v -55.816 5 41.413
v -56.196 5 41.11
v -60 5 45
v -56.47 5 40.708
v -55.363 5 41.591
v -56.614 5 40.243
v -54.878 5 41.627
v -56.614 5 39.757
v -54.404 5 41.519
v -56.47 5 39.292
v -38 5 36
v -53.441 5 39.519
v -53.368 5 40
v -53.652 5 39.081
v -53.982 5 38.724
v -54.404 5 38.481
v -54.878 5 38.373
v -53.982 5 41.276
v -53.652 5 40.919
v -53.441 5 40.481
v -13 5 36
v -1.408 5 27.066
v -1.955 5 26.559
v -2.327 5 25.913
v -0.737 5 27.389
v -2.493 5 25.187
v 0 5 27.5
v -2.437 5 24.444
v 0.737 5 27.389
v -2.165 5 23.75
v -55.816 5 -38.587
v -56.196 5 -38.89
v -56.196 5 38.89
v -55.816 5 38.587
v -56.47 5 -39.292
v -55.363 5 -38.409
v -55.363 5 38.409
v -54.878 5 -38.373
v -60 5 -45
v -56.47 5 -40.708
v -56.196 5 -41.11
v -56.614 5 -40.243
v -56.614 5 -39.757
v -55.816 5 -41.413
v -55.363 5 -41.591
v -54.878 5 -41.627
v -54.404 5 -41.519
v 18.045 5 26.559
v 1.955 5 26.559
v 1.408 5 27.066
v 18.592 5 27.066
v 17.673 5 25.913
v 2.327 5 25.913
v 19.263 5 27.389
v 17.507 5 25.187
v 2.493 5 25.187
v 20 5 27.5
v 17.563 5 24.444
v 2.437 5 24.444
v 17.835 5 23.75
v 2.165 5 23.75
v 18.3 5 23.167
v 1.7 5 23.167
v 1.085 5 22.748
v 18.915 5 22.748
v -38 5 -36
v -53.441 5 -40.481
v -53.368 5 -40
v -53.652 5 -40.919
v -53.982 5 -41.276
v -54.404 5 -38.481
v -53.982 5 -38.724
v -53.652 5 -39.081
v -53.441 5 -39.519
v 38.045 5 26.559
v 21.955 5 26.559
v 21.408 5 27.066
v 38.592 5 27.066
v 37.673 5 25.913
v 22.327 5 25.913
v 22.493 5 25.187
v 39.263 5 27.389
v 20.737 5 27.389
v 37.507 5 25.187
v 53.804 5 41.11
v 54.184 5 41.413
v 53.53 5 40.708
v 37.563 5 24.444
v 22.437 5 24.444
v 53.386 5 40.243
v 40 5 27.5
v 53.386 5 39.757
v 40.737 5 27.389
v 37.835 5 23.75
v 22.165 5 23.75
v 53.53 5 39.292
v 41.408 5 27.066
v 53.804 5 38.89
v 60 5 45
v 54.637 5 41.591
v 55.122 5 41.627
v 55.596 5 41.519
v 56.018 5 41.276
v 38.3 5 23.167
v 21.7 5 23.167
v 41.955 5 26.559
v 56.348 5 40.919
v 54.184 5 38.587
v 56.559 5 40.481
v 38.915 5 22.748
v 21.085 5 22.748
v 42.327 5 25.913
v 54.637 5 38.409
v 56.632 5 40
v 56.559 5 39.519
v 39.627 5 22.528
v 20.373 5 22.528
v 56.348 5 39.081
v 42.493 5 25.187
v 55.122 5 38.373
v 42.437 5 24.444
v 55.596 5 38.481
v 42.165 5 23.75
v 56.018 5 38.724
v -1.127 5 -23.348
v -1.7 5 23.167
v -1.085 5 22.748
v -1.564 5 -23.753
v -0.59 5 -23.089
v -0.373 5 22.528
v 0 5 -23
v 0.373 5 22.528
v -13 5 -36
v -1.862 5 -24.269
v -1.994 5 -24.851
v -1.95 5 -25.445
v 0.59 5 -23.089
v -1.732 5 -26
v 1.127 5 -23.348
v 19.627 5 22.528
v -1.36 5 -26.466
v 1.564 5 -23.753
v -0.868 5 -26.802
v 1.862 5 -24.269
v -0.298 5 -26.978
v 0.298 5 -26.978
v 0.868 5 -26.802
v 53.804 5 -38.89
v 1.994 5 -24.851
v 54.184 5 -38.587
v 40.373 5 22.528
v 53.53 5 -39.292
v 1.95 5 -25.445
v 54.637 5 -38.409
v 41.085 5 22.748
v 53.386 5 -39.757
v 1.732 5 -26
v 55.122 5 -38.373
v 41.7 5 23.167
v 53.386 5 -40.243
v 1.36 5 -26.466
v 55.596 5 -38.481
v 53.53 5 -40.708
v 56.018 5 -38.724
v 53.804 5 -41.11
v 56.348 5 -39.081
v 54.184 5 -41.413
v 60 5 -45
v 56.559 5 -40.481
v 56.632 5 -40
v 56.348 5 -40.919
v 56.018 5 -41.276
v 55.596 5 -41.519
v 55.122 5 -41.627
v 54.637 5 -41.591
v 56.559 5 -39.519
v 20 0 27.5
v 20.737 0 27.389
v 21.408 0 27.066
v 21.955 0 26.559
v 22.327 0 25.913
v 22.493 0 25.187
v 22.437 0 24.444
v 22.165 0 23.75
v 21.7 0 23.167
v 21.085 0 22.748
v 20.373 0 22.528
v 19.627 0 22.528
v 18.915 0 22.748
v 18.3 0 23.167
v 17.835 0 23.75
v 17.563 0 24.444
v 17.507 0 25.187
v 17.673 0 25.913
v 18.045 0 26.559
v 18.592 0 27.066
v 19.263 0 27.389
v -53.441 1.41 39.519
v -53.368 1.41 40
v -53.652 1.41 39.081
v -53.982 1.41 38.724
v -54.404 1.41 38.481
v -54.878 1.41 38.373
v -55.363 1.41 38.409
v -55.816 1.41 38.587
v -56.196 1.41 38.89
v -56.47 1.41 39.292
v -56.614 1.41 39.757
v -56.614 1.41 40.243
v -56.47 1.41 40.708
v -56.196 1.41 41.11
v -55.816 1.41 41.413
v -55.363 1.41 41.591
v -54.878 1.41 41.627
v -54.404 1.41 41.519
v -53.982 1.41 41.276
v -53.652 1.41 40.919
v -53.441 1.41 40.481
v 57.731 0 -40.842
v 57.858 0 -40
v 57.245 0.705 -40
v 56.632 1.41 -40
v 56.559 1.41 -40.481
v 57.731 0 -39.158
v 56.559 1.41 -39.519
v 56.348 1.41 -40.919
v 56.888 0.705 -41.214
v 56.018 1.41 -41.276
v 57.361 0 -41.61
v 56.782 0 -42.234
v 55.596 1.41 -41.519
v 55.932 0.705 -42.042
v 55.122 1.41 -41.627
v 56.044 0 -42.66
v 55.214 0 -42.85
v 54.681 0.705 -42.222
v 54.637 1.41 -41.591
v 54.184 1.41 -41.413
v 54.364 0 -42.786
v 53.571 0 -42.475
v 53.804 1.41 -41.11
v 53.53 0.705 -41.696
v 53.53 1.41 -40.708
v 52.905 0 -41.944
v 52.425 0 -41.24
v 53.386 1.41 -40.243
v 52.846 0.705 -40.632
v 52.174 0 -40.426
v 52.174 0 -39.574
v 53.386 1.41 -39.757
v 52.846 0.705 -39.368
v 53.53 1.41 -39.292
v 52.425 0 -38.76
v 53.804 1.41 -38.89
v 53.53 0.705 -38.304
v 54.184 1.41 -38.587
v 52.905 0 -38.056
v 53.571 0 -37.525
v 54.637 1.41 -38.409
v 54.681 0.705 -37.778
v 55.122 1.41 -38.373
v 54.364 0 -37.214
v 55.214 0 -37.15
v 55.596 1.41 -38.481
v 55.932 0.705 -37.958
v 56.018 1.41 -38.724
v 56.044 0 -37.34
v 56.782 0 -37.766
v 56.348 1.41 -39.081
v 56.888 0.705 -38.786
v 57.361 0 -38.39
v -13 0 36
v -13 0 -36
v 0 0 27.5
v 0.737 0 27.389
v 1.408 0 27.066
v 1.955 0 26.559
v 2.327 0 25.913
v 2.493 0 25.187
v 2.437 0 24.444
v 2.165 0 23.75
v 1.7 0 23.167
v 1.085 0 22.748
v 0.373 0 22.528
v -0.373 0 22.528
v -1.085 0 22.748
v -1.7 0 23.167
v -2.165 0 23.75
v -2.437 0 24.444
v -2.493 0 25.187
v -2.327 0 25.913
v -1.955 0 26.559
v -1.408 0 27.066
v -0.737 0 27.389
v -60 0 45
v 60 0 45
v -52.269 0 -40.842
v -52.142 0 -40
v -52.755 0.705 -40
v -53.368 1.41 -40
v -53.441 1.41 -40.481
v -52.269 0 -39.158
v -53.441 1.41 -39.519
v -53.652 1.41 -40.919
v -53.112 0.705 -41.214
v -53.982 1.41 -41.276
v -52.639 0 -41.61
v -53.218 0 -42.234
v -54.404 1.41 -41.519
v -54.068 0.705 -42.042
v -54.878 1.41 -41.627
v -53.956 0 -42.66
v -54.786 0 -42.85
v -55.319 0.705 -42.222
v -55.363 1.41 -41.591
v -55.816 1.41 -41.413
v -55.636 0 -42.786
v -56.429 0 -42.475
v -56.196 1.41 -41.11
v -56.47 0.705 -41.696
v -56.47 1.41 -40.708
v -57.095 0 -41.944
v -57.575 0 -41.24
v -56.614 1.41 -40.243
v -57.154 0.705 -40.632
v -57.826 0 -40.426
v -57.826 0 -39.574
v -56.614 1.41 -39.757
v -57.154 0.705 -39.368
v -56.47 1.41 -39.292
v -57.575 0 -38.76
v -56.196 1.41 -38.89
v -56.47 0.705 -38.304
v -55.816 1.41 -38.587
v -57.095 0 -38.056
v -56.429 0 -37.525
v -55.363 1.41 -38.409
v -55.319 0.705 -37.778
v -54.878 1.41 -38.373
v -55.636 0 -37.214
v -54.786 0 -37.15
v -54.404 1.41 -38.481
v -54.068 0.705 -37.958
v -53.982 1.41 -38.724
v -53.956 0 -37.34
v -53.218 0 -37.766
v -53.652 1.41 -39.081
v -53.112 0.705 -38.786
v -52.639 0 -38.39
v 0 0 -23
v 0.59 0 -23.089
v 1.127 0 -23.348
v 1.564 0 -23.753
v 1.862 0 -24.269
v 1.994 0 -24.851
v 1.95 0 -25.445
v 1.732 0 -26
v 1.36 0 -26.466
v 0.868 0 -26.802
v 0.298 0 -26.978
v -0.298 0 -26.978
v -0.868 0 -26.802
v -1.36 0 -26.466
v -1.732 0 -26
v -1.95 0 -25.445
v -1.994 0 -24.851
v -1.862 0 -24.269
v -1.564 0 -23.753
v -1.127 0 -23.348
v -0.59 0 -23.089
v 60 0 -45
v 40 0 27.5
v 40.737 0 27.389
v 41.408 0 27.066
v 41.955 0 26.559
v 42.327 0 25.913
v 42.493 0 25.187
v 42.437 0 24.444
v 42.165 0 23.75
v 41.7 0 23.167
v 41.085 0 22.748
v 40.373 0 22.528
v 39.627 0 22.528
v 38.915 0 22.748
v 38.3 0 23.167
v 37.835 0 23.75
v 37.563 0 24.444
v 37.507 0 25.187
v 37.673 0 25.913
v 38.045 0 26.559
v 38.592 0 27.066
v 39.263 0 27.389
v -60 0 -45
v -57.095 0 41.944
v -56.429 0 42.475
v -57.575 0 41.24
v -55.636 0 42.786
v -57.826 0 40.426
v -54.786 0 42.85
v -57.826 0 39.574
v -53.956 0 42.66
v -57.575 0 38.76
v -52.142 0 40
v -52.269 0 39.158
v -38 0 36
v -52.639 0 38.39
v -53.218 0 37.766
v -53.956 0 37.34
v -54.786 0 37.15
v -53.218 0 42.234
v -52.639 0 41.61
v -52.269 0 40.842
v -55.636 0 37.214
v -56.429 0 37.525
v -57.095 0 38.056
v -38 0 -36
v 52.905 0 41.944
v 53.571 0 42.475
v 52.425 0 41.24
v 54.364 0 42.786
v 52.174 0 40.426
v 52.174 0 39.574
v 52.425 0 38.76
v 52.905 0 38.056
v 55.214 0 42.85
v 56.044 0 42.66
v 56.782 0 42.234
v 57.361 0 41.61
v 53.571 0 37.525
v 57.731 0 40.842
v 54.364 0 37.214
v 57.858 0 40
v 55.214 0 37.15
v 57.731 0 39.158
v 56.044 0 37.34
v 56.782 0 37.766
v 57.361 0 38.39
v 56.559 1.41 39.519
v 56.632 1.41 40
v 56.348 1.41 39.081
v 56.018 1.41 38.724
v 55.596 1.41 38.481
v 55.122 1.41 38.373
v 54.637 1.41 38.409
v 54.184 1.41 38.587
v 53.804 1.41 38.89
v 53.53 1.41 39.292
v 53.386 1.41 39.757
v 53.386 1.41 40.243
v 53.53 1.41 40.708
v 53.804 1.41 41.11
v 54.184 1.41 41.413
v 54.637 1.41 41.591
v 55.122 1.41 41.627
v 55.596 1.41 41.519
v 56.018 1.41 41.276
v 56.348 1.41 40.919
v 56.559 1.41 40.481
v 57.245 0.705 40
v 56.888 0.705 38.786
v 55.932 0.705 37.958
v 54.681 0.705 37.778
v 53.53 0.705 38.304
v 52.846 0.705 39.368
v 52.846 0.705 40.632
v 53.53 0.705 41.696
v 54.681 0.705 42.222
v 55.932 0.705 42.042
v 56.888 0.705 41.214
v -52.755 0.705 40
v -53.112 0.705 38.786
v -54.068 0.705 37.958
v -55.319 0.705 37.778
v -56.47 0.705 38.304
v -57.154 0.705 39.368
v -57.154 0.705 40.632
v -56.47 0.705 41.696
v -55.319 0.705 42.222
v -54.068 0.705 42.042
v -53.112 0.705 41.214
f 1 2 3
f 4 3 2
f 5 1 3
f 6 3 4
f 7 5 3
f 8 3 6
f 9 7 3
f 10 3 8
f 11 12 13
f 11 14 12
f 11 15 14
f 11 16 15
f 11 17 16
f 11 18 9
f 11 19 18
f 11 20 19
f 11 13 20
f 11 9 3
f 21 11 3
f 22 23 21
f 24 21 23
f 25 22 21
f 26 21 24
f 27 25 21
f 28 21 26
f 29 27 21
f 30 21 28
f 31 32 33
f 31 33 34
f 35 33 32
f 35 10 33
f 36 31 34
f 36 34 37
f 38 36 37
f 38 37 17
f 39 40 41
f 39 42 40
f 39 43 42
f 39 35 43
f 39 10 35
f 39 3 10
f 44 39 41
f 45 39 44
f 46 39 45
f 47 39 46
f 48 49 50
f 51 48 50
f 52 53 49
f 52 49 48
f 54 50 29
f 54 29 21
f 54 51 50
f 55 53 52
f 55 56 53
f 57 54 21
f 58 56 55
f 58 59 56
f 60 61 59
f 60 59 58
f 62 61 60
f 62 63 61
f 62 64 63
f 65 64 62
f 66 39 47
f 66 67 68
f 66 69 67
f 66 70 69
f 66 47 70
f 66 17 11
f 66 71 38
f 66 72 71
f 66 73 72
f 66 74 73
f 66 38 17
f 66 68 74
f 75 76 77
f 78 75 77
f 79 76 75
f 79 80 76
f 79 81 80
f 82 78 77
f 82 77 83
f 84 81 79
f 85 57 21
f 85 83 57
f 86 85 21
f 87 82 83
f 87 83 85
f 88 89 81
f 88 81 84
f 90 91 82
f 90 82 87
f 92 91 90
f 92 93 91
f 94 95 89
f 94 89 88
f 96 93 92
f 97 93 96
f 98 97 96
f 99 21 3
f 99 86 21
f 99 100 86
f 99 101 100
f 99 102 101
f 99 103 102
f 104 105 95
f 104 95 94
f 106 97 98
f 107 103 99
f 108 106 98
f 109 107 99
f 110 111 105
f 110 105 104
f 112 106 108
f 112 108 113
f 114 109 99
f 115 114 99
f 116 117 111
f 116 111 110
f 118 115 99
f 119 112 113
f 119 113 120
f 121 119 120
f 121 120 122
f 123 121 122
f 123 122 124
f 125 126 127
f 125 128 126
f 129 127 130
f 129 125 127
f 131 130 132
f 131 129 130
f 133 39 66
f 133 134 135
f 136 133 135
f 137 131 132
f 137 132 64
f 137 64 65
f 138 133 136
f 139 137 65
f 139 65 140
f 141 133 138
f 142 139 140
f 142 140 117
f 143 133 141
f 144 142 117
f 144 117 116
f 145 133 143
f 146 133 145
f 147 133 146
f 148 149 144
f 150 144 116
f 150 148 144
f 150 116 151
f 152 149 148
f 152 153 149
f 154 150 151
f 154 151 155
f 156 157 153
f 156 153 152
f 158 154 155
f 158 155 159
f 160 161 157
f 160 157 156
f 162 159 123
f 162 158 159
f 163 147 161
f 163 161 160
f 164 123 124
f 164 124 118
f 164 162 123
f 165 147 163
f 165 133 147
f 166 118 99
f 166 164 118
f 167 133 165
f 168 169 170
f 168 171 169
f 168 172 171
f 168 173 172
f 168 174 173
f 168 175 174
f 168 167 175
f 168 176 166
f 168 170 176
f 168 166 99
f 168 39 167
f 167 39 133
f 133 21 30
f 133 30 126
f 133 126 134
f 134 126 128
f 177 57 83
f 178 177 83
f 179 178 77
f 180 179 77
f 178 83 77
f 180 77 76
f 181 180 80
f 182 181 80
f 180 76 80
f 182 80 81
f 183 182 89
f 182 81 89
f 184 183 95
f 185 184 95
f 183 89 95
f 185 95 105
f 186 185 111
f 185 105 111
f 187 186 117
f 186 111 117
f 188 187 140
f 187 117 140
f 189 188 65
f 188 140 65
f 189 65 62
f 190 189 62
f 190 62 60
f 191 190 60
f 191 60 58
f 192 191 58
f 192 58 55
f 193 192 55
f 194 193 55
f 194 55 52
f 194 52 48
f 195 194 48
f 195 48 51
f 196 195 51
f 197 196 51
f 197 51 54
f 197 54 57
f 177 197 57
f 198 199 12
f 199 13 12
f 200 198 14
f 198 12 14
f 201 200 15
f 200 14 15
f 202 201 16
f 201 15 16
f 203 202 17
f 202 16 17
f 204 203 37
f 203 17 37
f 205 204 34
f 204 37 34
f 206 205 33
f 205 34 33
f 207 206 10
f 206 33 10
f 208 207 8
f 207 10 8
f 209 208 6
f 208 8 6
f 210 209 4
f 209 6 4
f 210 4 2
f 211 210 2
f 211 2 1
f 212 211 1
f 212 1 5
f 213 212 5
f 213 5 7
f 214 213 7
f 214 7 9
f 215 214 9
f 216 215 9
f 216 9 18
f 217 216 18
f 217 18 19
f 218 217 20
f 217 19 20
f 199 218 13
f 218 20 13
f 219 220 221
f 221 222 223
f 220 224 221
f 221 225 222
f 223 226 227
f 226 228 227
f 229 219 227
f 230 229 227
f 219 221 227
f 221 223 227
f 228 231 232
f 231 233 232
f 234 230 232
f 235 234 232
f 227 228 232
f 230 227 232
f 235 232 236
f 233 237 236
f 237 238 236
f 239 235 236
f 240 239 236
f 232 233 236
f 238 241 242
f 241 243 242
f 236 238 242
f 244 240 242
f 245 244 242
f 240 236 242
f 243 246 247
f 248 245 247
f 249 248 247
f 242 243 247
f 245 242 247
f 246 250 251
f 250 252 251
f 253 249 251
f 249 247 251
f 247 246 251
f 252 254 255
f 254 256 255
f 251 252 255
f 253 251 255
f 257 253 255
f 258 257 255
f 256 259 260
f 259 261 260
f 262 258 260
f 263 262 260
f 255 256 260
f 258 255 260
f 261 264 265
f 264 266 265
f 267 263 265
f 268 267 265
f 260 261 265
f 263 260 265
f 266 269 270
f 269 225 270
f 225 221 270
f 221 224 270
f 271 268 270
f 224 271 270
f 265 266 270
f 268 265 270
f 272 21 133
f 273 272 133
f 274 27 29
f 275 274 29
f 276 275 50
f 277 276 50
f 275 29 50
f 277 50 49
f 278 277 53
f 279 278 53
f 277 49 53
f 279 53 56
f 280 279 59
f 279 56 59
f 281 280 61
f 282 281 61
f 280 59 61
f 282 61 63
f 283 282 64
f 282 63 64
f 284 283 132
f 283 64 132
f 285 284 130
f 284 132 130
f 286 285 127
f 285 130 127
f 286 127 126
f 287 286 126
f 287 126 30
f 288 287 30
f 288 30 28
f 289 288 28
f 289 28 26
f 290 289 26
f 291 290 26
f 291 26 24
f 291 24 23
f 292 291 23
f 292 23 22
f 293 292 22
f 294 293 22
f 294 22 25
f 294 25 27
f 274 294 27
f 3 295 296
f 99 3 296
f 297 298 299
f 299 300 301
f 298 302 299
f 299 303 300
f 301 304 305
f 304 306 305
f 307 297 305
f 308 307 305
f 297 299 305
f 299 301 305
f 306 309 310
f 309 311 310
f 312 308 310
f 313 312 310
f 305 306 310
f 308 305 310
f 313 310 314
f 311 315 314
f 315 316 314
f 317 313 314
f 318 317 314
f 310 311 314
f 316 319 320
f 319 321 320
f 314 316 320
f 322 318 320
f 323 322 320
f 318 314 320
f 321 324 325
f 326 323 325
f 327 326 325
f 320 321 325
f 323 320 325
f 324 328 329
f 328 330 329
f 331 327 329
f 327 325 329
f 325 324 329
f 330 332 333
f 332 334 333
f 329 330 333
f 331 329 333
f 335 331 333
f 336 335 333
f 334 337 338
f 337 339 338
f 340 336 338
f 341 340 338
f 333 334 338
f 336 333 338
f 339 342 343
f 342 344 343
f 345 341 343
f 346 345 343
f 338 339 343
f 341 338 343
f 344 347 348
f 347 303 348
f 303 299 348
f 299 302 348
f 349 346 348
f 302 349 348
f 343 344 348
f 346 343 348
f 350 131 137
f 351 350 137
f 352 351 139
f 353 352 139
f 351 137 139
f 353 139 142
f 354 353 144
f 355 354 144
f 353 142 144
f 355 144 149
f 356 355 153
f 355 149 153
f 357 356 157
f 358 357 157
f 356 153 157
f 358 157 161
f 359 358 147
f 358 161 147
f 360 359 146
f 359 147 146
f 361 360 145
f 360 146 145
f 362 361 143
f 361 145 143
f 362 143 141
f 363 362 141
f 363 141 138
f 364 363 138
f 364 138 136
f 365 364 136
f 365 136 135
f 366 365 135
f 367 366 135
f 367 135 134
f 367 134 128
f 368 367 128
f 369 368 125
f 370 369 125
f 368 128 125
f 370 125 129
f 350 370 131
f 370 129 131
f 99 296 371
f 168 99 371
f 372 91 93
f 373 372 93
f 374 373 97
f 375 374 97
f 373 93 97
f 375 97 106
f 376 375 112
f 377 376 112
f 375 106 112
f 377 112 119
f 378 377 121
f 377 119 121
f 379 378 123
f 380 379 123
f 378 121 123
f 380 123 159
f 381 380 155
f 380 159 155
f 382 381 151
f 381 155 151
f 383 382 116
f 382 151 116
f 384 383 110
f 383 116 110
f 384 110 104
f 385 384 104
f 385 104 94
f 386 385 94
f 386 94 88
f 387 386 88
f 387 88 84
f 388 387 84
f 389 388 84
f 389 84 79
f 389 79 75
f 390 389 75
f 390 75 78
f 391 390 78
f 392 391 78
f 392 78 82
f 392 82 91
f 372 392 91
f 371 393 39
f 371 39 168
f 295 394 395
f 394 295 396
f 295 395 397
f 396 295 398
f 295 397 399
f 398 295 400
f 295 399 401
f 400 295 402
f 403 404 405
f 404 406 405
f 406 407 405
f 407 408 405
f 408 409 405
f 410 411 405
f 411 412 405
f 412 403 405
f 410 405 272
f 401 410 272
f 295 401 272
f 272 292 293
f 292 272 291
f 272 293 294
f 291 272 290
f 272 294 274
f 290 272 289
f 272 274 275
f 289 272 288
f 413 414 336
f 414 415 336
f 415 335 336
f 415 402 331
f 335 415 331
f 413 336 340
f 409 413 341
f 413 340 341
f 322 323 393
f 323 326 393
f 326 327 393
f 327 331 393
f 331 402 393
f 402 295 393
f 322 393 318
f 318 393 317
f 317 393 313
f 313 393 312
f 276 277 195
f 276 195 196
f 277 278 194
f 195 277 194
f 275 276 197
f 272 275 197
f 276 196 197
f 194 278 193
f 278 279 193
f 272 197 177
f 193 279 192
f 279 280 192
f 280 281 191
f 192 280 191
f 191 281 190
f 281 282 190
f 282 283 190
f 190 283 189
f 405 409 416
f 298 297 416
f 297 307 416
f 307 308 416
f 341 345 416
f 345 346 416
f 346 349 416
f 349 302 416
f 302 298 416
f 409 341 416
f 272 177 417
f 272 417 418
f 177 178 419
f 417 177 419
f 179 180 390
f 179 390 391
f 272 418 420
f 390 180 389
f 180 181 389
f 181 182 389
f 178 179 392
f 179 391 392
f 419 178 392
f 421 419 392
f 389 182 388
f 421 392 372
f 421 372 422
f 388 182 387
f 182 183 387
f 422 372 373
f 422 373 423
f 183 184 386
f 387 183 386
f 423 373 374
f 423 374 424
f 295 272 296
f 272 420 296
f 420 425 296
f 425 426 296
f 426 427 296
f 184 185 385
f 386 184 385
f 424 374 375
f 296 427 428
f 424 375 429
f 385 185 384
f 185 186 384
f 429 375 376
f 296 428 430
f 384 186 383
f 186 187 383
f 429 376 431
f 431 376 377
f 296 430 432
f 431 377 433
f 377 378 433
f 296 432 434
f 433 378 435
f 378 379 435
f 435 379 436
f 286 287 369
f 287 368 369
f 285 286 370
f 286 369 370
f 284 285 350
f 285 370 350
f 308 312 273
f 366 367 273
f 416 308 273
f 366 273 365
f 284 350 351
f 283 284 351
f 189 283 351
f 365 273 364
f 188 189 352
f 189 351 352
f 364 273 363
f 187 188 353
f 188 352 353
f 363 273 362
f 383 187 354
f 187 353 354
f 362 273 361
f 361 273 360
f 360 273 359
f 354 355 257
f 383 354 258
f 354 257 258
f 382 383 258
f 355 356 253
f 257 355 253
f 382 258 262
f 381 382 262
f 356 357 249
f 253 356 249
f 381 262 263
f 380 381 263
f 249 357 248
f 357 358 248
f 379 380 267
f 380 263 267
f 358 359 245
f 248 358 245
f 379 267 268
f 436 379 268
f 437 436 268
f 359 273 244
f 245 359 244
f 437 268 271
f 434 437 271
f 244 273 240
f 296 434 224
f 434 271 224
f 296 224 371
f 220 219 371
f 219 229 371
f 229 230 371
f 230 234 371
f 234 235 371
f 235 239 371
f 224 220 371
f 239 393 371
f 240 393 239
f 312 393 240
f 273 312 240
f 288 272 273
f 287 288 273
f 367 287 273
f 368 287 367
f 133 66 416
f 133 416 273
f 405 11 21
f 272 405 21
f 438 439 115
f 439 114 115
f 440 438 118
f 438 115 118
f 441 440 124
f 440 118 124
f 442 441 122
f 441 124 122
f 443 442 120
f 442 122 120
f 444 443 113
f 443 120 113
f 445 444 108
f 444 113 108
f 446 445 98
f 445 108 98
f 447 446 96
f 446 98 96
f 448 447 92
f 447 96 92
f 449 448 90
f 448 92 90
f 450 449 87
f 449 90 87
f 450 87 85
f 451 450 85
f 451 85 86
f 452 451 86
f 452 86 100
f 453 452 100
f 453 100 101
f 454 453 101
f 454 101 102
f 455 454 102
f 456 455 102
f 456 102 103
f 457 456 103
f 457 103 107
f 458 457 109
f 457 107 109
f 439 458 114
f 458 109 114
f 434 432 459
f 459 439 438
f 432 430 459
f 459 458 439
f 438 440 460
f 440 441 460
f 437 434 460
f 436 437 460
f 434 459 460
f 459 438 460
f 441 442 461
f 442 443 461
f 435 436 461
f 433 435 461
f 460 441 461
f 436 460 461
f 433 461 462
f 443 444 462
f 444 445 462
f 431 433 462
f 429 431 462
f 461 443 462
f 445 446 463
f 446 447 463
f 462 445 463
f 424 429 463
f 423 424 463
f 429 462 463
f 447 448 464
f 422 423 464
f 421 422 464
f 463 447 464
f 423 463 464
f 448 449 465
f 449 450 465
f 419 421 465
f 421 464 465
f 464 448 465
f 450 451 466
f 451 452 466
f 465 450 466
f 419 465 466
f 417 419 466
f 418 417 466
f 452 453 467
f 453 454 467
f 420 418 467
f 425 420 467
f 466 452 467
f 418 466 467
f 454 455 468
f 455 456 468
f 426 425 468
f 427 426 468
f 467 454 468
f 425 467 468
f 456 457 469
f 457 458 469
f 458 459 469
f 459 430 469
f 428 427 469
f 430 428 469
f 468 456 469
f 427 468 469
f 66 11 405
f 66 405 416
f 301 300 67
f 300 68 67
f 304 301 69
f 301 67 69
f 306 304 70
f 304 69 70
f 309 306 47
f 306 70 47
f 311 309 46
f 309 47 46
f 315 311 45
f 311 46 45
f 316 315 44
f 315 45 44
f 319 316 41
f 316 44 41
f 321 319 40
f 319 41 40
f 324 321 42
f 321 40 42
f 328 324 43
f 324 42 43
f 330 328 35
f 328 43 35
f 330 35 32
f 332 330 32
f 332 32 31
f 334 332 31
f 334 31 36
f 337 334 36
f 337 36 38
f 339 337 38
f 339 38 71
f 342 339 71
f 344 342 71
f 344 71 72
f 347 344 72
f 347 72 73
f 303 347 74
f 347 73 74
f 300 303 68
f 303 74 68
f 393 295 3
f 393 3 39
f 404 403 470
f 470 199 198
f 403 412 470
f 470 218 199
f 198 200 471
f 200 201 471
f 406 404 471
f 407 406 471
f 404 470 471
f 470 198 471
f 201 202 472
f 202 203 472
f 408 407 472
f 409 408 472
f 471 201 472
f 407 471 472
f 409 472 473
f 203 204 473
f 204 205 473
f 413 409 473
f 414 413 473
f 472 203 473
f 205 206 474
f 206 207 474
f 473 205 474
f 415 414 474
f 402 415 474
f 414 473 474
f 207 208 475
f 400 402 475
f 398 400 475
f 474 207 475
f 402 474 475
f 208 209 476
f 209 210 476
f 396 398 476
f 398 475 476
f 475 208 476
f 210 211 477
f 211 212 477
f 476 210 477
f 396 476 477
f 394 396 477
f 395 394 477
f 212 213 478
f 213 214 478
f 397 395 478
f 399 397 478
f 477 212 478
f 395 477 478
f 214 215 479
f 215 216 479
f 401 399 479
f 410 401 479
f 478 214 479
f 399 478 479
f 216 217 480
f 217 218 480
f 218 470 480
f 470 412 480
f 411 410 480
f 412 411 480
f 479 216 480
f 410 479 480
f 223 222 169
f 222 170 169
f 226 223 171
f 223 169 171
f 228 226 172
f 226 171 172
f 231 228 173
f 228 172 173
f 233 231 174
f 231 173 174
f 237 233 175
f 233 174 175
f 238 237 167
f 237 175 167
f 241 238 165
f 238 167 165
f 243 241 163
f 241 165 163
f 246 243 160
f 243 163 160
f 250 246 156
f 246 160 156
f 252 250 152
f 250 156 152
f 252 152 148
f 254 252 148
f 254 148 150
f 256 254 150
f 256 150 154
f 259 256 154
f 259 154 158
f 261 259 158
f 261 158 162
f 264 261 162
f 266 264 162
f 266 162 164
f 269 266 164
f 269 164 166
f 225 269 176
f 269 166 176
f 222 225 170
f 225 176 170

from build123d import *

# Parameters (mm, degrees)
SKETCH1_W                                      = 120
SKETCH1_H                                      = 90
BOSS_EXTRUDE1_DEPTH                            = 5
CSK_FOR_4_FLAT_HEAD_MACHINE_SCREW1_D           = 3.2639
CSK_FOR_4_FLAT_HEAD_MACHINE_SCREW1_CSINK_D     = 5.715
CSK_FOR_4_FLAT_HEAD_MACHINE_SCREW1_CSINK_ANGLE = 82
SKETCH5_R                                      = 2.5
SKETCH5_W                                      = 25
SKETCH5_H                                      = 72
CUT_EXTRUDE3_DEPTH                             = 76.166481892
SKETCH6_R                                      = 2
CUT_EXTRUDE4_DEPTH                             = 5


with BuildPart() as part:
    # Sketch1 → Boss-Extrude1 (new body)
    with BuildSketch(Plane(origin=(0, 0, 0), x_dir=(1, 0, 0), z_dir=(0, 1, 0))):
        Rectangle(SKETCH1_W, SKETCH1_H)
    extrude(amount=BOSS_EXTRUDE1_DEPTH)

    # CSK for #4 Flat Head Machine Screw1 (through all)
    with Locations(Plane(origin=(0, 0, 0), x_dir=(-1, 0, 0), z_dir=(0, -1, 0))):
        with Locations((-55, 40), (-55, -40), (55, -40), (55, 40)):
            CounterSinkHole(CSK_FOR_4_FLAT_HEAD_MACHINE_SCREW1_D / 2, CSK_FOR_4_FLAT_HEAD_MACHINE_SCREW1_CSINK_D / 2, counter_sink_angle=CSK_FOR_4_FLAT_HEAD_MACHINE_SCREW1_CSINK_ANGLE)

    # Sketch5 → Cut-Extrude3 (cut, through all)
    with BuildSketch(Plane(origin=(0, 5, 0), x_dir=(1, 0, 0), z_dir=(0, 1, 0))):
        with Locations(Location((0, -25, 0), (0, 0, 270))):
            Circle(SKETCH5_R)
        with Locations(Location((20, -25, 0), (0, 0, 270))):
            Circle(SKETCH5_R)
        with Locations(Location((40, -25, 0), (0, 0, 270))):
            Circle(SKETCH5_R)
        with Locations((-25.5, 0)):
            Rectangle(SKETCH5_W, SKETCH5_H)
    extrude(amount=-CUT_EXTRUDE3_DEPTH, mode=Mode.SUBTRACT)

    # Sketch6 → Cut-Extrude4 (cut)
    with BuildSketch(Plane(origin=(0, 5, 0), x_dir=(1, 0, 0), z_dir=(0, 1, 0))):
        with Locations(Location((0, 25, 0), (0, 0, 270))):
            Circle(SKETCH6_R)
    extrude(amount=-CUT_EXTRUDE4_DEPTH, mode=Mode.SUBTRACT)


solid = part.part
